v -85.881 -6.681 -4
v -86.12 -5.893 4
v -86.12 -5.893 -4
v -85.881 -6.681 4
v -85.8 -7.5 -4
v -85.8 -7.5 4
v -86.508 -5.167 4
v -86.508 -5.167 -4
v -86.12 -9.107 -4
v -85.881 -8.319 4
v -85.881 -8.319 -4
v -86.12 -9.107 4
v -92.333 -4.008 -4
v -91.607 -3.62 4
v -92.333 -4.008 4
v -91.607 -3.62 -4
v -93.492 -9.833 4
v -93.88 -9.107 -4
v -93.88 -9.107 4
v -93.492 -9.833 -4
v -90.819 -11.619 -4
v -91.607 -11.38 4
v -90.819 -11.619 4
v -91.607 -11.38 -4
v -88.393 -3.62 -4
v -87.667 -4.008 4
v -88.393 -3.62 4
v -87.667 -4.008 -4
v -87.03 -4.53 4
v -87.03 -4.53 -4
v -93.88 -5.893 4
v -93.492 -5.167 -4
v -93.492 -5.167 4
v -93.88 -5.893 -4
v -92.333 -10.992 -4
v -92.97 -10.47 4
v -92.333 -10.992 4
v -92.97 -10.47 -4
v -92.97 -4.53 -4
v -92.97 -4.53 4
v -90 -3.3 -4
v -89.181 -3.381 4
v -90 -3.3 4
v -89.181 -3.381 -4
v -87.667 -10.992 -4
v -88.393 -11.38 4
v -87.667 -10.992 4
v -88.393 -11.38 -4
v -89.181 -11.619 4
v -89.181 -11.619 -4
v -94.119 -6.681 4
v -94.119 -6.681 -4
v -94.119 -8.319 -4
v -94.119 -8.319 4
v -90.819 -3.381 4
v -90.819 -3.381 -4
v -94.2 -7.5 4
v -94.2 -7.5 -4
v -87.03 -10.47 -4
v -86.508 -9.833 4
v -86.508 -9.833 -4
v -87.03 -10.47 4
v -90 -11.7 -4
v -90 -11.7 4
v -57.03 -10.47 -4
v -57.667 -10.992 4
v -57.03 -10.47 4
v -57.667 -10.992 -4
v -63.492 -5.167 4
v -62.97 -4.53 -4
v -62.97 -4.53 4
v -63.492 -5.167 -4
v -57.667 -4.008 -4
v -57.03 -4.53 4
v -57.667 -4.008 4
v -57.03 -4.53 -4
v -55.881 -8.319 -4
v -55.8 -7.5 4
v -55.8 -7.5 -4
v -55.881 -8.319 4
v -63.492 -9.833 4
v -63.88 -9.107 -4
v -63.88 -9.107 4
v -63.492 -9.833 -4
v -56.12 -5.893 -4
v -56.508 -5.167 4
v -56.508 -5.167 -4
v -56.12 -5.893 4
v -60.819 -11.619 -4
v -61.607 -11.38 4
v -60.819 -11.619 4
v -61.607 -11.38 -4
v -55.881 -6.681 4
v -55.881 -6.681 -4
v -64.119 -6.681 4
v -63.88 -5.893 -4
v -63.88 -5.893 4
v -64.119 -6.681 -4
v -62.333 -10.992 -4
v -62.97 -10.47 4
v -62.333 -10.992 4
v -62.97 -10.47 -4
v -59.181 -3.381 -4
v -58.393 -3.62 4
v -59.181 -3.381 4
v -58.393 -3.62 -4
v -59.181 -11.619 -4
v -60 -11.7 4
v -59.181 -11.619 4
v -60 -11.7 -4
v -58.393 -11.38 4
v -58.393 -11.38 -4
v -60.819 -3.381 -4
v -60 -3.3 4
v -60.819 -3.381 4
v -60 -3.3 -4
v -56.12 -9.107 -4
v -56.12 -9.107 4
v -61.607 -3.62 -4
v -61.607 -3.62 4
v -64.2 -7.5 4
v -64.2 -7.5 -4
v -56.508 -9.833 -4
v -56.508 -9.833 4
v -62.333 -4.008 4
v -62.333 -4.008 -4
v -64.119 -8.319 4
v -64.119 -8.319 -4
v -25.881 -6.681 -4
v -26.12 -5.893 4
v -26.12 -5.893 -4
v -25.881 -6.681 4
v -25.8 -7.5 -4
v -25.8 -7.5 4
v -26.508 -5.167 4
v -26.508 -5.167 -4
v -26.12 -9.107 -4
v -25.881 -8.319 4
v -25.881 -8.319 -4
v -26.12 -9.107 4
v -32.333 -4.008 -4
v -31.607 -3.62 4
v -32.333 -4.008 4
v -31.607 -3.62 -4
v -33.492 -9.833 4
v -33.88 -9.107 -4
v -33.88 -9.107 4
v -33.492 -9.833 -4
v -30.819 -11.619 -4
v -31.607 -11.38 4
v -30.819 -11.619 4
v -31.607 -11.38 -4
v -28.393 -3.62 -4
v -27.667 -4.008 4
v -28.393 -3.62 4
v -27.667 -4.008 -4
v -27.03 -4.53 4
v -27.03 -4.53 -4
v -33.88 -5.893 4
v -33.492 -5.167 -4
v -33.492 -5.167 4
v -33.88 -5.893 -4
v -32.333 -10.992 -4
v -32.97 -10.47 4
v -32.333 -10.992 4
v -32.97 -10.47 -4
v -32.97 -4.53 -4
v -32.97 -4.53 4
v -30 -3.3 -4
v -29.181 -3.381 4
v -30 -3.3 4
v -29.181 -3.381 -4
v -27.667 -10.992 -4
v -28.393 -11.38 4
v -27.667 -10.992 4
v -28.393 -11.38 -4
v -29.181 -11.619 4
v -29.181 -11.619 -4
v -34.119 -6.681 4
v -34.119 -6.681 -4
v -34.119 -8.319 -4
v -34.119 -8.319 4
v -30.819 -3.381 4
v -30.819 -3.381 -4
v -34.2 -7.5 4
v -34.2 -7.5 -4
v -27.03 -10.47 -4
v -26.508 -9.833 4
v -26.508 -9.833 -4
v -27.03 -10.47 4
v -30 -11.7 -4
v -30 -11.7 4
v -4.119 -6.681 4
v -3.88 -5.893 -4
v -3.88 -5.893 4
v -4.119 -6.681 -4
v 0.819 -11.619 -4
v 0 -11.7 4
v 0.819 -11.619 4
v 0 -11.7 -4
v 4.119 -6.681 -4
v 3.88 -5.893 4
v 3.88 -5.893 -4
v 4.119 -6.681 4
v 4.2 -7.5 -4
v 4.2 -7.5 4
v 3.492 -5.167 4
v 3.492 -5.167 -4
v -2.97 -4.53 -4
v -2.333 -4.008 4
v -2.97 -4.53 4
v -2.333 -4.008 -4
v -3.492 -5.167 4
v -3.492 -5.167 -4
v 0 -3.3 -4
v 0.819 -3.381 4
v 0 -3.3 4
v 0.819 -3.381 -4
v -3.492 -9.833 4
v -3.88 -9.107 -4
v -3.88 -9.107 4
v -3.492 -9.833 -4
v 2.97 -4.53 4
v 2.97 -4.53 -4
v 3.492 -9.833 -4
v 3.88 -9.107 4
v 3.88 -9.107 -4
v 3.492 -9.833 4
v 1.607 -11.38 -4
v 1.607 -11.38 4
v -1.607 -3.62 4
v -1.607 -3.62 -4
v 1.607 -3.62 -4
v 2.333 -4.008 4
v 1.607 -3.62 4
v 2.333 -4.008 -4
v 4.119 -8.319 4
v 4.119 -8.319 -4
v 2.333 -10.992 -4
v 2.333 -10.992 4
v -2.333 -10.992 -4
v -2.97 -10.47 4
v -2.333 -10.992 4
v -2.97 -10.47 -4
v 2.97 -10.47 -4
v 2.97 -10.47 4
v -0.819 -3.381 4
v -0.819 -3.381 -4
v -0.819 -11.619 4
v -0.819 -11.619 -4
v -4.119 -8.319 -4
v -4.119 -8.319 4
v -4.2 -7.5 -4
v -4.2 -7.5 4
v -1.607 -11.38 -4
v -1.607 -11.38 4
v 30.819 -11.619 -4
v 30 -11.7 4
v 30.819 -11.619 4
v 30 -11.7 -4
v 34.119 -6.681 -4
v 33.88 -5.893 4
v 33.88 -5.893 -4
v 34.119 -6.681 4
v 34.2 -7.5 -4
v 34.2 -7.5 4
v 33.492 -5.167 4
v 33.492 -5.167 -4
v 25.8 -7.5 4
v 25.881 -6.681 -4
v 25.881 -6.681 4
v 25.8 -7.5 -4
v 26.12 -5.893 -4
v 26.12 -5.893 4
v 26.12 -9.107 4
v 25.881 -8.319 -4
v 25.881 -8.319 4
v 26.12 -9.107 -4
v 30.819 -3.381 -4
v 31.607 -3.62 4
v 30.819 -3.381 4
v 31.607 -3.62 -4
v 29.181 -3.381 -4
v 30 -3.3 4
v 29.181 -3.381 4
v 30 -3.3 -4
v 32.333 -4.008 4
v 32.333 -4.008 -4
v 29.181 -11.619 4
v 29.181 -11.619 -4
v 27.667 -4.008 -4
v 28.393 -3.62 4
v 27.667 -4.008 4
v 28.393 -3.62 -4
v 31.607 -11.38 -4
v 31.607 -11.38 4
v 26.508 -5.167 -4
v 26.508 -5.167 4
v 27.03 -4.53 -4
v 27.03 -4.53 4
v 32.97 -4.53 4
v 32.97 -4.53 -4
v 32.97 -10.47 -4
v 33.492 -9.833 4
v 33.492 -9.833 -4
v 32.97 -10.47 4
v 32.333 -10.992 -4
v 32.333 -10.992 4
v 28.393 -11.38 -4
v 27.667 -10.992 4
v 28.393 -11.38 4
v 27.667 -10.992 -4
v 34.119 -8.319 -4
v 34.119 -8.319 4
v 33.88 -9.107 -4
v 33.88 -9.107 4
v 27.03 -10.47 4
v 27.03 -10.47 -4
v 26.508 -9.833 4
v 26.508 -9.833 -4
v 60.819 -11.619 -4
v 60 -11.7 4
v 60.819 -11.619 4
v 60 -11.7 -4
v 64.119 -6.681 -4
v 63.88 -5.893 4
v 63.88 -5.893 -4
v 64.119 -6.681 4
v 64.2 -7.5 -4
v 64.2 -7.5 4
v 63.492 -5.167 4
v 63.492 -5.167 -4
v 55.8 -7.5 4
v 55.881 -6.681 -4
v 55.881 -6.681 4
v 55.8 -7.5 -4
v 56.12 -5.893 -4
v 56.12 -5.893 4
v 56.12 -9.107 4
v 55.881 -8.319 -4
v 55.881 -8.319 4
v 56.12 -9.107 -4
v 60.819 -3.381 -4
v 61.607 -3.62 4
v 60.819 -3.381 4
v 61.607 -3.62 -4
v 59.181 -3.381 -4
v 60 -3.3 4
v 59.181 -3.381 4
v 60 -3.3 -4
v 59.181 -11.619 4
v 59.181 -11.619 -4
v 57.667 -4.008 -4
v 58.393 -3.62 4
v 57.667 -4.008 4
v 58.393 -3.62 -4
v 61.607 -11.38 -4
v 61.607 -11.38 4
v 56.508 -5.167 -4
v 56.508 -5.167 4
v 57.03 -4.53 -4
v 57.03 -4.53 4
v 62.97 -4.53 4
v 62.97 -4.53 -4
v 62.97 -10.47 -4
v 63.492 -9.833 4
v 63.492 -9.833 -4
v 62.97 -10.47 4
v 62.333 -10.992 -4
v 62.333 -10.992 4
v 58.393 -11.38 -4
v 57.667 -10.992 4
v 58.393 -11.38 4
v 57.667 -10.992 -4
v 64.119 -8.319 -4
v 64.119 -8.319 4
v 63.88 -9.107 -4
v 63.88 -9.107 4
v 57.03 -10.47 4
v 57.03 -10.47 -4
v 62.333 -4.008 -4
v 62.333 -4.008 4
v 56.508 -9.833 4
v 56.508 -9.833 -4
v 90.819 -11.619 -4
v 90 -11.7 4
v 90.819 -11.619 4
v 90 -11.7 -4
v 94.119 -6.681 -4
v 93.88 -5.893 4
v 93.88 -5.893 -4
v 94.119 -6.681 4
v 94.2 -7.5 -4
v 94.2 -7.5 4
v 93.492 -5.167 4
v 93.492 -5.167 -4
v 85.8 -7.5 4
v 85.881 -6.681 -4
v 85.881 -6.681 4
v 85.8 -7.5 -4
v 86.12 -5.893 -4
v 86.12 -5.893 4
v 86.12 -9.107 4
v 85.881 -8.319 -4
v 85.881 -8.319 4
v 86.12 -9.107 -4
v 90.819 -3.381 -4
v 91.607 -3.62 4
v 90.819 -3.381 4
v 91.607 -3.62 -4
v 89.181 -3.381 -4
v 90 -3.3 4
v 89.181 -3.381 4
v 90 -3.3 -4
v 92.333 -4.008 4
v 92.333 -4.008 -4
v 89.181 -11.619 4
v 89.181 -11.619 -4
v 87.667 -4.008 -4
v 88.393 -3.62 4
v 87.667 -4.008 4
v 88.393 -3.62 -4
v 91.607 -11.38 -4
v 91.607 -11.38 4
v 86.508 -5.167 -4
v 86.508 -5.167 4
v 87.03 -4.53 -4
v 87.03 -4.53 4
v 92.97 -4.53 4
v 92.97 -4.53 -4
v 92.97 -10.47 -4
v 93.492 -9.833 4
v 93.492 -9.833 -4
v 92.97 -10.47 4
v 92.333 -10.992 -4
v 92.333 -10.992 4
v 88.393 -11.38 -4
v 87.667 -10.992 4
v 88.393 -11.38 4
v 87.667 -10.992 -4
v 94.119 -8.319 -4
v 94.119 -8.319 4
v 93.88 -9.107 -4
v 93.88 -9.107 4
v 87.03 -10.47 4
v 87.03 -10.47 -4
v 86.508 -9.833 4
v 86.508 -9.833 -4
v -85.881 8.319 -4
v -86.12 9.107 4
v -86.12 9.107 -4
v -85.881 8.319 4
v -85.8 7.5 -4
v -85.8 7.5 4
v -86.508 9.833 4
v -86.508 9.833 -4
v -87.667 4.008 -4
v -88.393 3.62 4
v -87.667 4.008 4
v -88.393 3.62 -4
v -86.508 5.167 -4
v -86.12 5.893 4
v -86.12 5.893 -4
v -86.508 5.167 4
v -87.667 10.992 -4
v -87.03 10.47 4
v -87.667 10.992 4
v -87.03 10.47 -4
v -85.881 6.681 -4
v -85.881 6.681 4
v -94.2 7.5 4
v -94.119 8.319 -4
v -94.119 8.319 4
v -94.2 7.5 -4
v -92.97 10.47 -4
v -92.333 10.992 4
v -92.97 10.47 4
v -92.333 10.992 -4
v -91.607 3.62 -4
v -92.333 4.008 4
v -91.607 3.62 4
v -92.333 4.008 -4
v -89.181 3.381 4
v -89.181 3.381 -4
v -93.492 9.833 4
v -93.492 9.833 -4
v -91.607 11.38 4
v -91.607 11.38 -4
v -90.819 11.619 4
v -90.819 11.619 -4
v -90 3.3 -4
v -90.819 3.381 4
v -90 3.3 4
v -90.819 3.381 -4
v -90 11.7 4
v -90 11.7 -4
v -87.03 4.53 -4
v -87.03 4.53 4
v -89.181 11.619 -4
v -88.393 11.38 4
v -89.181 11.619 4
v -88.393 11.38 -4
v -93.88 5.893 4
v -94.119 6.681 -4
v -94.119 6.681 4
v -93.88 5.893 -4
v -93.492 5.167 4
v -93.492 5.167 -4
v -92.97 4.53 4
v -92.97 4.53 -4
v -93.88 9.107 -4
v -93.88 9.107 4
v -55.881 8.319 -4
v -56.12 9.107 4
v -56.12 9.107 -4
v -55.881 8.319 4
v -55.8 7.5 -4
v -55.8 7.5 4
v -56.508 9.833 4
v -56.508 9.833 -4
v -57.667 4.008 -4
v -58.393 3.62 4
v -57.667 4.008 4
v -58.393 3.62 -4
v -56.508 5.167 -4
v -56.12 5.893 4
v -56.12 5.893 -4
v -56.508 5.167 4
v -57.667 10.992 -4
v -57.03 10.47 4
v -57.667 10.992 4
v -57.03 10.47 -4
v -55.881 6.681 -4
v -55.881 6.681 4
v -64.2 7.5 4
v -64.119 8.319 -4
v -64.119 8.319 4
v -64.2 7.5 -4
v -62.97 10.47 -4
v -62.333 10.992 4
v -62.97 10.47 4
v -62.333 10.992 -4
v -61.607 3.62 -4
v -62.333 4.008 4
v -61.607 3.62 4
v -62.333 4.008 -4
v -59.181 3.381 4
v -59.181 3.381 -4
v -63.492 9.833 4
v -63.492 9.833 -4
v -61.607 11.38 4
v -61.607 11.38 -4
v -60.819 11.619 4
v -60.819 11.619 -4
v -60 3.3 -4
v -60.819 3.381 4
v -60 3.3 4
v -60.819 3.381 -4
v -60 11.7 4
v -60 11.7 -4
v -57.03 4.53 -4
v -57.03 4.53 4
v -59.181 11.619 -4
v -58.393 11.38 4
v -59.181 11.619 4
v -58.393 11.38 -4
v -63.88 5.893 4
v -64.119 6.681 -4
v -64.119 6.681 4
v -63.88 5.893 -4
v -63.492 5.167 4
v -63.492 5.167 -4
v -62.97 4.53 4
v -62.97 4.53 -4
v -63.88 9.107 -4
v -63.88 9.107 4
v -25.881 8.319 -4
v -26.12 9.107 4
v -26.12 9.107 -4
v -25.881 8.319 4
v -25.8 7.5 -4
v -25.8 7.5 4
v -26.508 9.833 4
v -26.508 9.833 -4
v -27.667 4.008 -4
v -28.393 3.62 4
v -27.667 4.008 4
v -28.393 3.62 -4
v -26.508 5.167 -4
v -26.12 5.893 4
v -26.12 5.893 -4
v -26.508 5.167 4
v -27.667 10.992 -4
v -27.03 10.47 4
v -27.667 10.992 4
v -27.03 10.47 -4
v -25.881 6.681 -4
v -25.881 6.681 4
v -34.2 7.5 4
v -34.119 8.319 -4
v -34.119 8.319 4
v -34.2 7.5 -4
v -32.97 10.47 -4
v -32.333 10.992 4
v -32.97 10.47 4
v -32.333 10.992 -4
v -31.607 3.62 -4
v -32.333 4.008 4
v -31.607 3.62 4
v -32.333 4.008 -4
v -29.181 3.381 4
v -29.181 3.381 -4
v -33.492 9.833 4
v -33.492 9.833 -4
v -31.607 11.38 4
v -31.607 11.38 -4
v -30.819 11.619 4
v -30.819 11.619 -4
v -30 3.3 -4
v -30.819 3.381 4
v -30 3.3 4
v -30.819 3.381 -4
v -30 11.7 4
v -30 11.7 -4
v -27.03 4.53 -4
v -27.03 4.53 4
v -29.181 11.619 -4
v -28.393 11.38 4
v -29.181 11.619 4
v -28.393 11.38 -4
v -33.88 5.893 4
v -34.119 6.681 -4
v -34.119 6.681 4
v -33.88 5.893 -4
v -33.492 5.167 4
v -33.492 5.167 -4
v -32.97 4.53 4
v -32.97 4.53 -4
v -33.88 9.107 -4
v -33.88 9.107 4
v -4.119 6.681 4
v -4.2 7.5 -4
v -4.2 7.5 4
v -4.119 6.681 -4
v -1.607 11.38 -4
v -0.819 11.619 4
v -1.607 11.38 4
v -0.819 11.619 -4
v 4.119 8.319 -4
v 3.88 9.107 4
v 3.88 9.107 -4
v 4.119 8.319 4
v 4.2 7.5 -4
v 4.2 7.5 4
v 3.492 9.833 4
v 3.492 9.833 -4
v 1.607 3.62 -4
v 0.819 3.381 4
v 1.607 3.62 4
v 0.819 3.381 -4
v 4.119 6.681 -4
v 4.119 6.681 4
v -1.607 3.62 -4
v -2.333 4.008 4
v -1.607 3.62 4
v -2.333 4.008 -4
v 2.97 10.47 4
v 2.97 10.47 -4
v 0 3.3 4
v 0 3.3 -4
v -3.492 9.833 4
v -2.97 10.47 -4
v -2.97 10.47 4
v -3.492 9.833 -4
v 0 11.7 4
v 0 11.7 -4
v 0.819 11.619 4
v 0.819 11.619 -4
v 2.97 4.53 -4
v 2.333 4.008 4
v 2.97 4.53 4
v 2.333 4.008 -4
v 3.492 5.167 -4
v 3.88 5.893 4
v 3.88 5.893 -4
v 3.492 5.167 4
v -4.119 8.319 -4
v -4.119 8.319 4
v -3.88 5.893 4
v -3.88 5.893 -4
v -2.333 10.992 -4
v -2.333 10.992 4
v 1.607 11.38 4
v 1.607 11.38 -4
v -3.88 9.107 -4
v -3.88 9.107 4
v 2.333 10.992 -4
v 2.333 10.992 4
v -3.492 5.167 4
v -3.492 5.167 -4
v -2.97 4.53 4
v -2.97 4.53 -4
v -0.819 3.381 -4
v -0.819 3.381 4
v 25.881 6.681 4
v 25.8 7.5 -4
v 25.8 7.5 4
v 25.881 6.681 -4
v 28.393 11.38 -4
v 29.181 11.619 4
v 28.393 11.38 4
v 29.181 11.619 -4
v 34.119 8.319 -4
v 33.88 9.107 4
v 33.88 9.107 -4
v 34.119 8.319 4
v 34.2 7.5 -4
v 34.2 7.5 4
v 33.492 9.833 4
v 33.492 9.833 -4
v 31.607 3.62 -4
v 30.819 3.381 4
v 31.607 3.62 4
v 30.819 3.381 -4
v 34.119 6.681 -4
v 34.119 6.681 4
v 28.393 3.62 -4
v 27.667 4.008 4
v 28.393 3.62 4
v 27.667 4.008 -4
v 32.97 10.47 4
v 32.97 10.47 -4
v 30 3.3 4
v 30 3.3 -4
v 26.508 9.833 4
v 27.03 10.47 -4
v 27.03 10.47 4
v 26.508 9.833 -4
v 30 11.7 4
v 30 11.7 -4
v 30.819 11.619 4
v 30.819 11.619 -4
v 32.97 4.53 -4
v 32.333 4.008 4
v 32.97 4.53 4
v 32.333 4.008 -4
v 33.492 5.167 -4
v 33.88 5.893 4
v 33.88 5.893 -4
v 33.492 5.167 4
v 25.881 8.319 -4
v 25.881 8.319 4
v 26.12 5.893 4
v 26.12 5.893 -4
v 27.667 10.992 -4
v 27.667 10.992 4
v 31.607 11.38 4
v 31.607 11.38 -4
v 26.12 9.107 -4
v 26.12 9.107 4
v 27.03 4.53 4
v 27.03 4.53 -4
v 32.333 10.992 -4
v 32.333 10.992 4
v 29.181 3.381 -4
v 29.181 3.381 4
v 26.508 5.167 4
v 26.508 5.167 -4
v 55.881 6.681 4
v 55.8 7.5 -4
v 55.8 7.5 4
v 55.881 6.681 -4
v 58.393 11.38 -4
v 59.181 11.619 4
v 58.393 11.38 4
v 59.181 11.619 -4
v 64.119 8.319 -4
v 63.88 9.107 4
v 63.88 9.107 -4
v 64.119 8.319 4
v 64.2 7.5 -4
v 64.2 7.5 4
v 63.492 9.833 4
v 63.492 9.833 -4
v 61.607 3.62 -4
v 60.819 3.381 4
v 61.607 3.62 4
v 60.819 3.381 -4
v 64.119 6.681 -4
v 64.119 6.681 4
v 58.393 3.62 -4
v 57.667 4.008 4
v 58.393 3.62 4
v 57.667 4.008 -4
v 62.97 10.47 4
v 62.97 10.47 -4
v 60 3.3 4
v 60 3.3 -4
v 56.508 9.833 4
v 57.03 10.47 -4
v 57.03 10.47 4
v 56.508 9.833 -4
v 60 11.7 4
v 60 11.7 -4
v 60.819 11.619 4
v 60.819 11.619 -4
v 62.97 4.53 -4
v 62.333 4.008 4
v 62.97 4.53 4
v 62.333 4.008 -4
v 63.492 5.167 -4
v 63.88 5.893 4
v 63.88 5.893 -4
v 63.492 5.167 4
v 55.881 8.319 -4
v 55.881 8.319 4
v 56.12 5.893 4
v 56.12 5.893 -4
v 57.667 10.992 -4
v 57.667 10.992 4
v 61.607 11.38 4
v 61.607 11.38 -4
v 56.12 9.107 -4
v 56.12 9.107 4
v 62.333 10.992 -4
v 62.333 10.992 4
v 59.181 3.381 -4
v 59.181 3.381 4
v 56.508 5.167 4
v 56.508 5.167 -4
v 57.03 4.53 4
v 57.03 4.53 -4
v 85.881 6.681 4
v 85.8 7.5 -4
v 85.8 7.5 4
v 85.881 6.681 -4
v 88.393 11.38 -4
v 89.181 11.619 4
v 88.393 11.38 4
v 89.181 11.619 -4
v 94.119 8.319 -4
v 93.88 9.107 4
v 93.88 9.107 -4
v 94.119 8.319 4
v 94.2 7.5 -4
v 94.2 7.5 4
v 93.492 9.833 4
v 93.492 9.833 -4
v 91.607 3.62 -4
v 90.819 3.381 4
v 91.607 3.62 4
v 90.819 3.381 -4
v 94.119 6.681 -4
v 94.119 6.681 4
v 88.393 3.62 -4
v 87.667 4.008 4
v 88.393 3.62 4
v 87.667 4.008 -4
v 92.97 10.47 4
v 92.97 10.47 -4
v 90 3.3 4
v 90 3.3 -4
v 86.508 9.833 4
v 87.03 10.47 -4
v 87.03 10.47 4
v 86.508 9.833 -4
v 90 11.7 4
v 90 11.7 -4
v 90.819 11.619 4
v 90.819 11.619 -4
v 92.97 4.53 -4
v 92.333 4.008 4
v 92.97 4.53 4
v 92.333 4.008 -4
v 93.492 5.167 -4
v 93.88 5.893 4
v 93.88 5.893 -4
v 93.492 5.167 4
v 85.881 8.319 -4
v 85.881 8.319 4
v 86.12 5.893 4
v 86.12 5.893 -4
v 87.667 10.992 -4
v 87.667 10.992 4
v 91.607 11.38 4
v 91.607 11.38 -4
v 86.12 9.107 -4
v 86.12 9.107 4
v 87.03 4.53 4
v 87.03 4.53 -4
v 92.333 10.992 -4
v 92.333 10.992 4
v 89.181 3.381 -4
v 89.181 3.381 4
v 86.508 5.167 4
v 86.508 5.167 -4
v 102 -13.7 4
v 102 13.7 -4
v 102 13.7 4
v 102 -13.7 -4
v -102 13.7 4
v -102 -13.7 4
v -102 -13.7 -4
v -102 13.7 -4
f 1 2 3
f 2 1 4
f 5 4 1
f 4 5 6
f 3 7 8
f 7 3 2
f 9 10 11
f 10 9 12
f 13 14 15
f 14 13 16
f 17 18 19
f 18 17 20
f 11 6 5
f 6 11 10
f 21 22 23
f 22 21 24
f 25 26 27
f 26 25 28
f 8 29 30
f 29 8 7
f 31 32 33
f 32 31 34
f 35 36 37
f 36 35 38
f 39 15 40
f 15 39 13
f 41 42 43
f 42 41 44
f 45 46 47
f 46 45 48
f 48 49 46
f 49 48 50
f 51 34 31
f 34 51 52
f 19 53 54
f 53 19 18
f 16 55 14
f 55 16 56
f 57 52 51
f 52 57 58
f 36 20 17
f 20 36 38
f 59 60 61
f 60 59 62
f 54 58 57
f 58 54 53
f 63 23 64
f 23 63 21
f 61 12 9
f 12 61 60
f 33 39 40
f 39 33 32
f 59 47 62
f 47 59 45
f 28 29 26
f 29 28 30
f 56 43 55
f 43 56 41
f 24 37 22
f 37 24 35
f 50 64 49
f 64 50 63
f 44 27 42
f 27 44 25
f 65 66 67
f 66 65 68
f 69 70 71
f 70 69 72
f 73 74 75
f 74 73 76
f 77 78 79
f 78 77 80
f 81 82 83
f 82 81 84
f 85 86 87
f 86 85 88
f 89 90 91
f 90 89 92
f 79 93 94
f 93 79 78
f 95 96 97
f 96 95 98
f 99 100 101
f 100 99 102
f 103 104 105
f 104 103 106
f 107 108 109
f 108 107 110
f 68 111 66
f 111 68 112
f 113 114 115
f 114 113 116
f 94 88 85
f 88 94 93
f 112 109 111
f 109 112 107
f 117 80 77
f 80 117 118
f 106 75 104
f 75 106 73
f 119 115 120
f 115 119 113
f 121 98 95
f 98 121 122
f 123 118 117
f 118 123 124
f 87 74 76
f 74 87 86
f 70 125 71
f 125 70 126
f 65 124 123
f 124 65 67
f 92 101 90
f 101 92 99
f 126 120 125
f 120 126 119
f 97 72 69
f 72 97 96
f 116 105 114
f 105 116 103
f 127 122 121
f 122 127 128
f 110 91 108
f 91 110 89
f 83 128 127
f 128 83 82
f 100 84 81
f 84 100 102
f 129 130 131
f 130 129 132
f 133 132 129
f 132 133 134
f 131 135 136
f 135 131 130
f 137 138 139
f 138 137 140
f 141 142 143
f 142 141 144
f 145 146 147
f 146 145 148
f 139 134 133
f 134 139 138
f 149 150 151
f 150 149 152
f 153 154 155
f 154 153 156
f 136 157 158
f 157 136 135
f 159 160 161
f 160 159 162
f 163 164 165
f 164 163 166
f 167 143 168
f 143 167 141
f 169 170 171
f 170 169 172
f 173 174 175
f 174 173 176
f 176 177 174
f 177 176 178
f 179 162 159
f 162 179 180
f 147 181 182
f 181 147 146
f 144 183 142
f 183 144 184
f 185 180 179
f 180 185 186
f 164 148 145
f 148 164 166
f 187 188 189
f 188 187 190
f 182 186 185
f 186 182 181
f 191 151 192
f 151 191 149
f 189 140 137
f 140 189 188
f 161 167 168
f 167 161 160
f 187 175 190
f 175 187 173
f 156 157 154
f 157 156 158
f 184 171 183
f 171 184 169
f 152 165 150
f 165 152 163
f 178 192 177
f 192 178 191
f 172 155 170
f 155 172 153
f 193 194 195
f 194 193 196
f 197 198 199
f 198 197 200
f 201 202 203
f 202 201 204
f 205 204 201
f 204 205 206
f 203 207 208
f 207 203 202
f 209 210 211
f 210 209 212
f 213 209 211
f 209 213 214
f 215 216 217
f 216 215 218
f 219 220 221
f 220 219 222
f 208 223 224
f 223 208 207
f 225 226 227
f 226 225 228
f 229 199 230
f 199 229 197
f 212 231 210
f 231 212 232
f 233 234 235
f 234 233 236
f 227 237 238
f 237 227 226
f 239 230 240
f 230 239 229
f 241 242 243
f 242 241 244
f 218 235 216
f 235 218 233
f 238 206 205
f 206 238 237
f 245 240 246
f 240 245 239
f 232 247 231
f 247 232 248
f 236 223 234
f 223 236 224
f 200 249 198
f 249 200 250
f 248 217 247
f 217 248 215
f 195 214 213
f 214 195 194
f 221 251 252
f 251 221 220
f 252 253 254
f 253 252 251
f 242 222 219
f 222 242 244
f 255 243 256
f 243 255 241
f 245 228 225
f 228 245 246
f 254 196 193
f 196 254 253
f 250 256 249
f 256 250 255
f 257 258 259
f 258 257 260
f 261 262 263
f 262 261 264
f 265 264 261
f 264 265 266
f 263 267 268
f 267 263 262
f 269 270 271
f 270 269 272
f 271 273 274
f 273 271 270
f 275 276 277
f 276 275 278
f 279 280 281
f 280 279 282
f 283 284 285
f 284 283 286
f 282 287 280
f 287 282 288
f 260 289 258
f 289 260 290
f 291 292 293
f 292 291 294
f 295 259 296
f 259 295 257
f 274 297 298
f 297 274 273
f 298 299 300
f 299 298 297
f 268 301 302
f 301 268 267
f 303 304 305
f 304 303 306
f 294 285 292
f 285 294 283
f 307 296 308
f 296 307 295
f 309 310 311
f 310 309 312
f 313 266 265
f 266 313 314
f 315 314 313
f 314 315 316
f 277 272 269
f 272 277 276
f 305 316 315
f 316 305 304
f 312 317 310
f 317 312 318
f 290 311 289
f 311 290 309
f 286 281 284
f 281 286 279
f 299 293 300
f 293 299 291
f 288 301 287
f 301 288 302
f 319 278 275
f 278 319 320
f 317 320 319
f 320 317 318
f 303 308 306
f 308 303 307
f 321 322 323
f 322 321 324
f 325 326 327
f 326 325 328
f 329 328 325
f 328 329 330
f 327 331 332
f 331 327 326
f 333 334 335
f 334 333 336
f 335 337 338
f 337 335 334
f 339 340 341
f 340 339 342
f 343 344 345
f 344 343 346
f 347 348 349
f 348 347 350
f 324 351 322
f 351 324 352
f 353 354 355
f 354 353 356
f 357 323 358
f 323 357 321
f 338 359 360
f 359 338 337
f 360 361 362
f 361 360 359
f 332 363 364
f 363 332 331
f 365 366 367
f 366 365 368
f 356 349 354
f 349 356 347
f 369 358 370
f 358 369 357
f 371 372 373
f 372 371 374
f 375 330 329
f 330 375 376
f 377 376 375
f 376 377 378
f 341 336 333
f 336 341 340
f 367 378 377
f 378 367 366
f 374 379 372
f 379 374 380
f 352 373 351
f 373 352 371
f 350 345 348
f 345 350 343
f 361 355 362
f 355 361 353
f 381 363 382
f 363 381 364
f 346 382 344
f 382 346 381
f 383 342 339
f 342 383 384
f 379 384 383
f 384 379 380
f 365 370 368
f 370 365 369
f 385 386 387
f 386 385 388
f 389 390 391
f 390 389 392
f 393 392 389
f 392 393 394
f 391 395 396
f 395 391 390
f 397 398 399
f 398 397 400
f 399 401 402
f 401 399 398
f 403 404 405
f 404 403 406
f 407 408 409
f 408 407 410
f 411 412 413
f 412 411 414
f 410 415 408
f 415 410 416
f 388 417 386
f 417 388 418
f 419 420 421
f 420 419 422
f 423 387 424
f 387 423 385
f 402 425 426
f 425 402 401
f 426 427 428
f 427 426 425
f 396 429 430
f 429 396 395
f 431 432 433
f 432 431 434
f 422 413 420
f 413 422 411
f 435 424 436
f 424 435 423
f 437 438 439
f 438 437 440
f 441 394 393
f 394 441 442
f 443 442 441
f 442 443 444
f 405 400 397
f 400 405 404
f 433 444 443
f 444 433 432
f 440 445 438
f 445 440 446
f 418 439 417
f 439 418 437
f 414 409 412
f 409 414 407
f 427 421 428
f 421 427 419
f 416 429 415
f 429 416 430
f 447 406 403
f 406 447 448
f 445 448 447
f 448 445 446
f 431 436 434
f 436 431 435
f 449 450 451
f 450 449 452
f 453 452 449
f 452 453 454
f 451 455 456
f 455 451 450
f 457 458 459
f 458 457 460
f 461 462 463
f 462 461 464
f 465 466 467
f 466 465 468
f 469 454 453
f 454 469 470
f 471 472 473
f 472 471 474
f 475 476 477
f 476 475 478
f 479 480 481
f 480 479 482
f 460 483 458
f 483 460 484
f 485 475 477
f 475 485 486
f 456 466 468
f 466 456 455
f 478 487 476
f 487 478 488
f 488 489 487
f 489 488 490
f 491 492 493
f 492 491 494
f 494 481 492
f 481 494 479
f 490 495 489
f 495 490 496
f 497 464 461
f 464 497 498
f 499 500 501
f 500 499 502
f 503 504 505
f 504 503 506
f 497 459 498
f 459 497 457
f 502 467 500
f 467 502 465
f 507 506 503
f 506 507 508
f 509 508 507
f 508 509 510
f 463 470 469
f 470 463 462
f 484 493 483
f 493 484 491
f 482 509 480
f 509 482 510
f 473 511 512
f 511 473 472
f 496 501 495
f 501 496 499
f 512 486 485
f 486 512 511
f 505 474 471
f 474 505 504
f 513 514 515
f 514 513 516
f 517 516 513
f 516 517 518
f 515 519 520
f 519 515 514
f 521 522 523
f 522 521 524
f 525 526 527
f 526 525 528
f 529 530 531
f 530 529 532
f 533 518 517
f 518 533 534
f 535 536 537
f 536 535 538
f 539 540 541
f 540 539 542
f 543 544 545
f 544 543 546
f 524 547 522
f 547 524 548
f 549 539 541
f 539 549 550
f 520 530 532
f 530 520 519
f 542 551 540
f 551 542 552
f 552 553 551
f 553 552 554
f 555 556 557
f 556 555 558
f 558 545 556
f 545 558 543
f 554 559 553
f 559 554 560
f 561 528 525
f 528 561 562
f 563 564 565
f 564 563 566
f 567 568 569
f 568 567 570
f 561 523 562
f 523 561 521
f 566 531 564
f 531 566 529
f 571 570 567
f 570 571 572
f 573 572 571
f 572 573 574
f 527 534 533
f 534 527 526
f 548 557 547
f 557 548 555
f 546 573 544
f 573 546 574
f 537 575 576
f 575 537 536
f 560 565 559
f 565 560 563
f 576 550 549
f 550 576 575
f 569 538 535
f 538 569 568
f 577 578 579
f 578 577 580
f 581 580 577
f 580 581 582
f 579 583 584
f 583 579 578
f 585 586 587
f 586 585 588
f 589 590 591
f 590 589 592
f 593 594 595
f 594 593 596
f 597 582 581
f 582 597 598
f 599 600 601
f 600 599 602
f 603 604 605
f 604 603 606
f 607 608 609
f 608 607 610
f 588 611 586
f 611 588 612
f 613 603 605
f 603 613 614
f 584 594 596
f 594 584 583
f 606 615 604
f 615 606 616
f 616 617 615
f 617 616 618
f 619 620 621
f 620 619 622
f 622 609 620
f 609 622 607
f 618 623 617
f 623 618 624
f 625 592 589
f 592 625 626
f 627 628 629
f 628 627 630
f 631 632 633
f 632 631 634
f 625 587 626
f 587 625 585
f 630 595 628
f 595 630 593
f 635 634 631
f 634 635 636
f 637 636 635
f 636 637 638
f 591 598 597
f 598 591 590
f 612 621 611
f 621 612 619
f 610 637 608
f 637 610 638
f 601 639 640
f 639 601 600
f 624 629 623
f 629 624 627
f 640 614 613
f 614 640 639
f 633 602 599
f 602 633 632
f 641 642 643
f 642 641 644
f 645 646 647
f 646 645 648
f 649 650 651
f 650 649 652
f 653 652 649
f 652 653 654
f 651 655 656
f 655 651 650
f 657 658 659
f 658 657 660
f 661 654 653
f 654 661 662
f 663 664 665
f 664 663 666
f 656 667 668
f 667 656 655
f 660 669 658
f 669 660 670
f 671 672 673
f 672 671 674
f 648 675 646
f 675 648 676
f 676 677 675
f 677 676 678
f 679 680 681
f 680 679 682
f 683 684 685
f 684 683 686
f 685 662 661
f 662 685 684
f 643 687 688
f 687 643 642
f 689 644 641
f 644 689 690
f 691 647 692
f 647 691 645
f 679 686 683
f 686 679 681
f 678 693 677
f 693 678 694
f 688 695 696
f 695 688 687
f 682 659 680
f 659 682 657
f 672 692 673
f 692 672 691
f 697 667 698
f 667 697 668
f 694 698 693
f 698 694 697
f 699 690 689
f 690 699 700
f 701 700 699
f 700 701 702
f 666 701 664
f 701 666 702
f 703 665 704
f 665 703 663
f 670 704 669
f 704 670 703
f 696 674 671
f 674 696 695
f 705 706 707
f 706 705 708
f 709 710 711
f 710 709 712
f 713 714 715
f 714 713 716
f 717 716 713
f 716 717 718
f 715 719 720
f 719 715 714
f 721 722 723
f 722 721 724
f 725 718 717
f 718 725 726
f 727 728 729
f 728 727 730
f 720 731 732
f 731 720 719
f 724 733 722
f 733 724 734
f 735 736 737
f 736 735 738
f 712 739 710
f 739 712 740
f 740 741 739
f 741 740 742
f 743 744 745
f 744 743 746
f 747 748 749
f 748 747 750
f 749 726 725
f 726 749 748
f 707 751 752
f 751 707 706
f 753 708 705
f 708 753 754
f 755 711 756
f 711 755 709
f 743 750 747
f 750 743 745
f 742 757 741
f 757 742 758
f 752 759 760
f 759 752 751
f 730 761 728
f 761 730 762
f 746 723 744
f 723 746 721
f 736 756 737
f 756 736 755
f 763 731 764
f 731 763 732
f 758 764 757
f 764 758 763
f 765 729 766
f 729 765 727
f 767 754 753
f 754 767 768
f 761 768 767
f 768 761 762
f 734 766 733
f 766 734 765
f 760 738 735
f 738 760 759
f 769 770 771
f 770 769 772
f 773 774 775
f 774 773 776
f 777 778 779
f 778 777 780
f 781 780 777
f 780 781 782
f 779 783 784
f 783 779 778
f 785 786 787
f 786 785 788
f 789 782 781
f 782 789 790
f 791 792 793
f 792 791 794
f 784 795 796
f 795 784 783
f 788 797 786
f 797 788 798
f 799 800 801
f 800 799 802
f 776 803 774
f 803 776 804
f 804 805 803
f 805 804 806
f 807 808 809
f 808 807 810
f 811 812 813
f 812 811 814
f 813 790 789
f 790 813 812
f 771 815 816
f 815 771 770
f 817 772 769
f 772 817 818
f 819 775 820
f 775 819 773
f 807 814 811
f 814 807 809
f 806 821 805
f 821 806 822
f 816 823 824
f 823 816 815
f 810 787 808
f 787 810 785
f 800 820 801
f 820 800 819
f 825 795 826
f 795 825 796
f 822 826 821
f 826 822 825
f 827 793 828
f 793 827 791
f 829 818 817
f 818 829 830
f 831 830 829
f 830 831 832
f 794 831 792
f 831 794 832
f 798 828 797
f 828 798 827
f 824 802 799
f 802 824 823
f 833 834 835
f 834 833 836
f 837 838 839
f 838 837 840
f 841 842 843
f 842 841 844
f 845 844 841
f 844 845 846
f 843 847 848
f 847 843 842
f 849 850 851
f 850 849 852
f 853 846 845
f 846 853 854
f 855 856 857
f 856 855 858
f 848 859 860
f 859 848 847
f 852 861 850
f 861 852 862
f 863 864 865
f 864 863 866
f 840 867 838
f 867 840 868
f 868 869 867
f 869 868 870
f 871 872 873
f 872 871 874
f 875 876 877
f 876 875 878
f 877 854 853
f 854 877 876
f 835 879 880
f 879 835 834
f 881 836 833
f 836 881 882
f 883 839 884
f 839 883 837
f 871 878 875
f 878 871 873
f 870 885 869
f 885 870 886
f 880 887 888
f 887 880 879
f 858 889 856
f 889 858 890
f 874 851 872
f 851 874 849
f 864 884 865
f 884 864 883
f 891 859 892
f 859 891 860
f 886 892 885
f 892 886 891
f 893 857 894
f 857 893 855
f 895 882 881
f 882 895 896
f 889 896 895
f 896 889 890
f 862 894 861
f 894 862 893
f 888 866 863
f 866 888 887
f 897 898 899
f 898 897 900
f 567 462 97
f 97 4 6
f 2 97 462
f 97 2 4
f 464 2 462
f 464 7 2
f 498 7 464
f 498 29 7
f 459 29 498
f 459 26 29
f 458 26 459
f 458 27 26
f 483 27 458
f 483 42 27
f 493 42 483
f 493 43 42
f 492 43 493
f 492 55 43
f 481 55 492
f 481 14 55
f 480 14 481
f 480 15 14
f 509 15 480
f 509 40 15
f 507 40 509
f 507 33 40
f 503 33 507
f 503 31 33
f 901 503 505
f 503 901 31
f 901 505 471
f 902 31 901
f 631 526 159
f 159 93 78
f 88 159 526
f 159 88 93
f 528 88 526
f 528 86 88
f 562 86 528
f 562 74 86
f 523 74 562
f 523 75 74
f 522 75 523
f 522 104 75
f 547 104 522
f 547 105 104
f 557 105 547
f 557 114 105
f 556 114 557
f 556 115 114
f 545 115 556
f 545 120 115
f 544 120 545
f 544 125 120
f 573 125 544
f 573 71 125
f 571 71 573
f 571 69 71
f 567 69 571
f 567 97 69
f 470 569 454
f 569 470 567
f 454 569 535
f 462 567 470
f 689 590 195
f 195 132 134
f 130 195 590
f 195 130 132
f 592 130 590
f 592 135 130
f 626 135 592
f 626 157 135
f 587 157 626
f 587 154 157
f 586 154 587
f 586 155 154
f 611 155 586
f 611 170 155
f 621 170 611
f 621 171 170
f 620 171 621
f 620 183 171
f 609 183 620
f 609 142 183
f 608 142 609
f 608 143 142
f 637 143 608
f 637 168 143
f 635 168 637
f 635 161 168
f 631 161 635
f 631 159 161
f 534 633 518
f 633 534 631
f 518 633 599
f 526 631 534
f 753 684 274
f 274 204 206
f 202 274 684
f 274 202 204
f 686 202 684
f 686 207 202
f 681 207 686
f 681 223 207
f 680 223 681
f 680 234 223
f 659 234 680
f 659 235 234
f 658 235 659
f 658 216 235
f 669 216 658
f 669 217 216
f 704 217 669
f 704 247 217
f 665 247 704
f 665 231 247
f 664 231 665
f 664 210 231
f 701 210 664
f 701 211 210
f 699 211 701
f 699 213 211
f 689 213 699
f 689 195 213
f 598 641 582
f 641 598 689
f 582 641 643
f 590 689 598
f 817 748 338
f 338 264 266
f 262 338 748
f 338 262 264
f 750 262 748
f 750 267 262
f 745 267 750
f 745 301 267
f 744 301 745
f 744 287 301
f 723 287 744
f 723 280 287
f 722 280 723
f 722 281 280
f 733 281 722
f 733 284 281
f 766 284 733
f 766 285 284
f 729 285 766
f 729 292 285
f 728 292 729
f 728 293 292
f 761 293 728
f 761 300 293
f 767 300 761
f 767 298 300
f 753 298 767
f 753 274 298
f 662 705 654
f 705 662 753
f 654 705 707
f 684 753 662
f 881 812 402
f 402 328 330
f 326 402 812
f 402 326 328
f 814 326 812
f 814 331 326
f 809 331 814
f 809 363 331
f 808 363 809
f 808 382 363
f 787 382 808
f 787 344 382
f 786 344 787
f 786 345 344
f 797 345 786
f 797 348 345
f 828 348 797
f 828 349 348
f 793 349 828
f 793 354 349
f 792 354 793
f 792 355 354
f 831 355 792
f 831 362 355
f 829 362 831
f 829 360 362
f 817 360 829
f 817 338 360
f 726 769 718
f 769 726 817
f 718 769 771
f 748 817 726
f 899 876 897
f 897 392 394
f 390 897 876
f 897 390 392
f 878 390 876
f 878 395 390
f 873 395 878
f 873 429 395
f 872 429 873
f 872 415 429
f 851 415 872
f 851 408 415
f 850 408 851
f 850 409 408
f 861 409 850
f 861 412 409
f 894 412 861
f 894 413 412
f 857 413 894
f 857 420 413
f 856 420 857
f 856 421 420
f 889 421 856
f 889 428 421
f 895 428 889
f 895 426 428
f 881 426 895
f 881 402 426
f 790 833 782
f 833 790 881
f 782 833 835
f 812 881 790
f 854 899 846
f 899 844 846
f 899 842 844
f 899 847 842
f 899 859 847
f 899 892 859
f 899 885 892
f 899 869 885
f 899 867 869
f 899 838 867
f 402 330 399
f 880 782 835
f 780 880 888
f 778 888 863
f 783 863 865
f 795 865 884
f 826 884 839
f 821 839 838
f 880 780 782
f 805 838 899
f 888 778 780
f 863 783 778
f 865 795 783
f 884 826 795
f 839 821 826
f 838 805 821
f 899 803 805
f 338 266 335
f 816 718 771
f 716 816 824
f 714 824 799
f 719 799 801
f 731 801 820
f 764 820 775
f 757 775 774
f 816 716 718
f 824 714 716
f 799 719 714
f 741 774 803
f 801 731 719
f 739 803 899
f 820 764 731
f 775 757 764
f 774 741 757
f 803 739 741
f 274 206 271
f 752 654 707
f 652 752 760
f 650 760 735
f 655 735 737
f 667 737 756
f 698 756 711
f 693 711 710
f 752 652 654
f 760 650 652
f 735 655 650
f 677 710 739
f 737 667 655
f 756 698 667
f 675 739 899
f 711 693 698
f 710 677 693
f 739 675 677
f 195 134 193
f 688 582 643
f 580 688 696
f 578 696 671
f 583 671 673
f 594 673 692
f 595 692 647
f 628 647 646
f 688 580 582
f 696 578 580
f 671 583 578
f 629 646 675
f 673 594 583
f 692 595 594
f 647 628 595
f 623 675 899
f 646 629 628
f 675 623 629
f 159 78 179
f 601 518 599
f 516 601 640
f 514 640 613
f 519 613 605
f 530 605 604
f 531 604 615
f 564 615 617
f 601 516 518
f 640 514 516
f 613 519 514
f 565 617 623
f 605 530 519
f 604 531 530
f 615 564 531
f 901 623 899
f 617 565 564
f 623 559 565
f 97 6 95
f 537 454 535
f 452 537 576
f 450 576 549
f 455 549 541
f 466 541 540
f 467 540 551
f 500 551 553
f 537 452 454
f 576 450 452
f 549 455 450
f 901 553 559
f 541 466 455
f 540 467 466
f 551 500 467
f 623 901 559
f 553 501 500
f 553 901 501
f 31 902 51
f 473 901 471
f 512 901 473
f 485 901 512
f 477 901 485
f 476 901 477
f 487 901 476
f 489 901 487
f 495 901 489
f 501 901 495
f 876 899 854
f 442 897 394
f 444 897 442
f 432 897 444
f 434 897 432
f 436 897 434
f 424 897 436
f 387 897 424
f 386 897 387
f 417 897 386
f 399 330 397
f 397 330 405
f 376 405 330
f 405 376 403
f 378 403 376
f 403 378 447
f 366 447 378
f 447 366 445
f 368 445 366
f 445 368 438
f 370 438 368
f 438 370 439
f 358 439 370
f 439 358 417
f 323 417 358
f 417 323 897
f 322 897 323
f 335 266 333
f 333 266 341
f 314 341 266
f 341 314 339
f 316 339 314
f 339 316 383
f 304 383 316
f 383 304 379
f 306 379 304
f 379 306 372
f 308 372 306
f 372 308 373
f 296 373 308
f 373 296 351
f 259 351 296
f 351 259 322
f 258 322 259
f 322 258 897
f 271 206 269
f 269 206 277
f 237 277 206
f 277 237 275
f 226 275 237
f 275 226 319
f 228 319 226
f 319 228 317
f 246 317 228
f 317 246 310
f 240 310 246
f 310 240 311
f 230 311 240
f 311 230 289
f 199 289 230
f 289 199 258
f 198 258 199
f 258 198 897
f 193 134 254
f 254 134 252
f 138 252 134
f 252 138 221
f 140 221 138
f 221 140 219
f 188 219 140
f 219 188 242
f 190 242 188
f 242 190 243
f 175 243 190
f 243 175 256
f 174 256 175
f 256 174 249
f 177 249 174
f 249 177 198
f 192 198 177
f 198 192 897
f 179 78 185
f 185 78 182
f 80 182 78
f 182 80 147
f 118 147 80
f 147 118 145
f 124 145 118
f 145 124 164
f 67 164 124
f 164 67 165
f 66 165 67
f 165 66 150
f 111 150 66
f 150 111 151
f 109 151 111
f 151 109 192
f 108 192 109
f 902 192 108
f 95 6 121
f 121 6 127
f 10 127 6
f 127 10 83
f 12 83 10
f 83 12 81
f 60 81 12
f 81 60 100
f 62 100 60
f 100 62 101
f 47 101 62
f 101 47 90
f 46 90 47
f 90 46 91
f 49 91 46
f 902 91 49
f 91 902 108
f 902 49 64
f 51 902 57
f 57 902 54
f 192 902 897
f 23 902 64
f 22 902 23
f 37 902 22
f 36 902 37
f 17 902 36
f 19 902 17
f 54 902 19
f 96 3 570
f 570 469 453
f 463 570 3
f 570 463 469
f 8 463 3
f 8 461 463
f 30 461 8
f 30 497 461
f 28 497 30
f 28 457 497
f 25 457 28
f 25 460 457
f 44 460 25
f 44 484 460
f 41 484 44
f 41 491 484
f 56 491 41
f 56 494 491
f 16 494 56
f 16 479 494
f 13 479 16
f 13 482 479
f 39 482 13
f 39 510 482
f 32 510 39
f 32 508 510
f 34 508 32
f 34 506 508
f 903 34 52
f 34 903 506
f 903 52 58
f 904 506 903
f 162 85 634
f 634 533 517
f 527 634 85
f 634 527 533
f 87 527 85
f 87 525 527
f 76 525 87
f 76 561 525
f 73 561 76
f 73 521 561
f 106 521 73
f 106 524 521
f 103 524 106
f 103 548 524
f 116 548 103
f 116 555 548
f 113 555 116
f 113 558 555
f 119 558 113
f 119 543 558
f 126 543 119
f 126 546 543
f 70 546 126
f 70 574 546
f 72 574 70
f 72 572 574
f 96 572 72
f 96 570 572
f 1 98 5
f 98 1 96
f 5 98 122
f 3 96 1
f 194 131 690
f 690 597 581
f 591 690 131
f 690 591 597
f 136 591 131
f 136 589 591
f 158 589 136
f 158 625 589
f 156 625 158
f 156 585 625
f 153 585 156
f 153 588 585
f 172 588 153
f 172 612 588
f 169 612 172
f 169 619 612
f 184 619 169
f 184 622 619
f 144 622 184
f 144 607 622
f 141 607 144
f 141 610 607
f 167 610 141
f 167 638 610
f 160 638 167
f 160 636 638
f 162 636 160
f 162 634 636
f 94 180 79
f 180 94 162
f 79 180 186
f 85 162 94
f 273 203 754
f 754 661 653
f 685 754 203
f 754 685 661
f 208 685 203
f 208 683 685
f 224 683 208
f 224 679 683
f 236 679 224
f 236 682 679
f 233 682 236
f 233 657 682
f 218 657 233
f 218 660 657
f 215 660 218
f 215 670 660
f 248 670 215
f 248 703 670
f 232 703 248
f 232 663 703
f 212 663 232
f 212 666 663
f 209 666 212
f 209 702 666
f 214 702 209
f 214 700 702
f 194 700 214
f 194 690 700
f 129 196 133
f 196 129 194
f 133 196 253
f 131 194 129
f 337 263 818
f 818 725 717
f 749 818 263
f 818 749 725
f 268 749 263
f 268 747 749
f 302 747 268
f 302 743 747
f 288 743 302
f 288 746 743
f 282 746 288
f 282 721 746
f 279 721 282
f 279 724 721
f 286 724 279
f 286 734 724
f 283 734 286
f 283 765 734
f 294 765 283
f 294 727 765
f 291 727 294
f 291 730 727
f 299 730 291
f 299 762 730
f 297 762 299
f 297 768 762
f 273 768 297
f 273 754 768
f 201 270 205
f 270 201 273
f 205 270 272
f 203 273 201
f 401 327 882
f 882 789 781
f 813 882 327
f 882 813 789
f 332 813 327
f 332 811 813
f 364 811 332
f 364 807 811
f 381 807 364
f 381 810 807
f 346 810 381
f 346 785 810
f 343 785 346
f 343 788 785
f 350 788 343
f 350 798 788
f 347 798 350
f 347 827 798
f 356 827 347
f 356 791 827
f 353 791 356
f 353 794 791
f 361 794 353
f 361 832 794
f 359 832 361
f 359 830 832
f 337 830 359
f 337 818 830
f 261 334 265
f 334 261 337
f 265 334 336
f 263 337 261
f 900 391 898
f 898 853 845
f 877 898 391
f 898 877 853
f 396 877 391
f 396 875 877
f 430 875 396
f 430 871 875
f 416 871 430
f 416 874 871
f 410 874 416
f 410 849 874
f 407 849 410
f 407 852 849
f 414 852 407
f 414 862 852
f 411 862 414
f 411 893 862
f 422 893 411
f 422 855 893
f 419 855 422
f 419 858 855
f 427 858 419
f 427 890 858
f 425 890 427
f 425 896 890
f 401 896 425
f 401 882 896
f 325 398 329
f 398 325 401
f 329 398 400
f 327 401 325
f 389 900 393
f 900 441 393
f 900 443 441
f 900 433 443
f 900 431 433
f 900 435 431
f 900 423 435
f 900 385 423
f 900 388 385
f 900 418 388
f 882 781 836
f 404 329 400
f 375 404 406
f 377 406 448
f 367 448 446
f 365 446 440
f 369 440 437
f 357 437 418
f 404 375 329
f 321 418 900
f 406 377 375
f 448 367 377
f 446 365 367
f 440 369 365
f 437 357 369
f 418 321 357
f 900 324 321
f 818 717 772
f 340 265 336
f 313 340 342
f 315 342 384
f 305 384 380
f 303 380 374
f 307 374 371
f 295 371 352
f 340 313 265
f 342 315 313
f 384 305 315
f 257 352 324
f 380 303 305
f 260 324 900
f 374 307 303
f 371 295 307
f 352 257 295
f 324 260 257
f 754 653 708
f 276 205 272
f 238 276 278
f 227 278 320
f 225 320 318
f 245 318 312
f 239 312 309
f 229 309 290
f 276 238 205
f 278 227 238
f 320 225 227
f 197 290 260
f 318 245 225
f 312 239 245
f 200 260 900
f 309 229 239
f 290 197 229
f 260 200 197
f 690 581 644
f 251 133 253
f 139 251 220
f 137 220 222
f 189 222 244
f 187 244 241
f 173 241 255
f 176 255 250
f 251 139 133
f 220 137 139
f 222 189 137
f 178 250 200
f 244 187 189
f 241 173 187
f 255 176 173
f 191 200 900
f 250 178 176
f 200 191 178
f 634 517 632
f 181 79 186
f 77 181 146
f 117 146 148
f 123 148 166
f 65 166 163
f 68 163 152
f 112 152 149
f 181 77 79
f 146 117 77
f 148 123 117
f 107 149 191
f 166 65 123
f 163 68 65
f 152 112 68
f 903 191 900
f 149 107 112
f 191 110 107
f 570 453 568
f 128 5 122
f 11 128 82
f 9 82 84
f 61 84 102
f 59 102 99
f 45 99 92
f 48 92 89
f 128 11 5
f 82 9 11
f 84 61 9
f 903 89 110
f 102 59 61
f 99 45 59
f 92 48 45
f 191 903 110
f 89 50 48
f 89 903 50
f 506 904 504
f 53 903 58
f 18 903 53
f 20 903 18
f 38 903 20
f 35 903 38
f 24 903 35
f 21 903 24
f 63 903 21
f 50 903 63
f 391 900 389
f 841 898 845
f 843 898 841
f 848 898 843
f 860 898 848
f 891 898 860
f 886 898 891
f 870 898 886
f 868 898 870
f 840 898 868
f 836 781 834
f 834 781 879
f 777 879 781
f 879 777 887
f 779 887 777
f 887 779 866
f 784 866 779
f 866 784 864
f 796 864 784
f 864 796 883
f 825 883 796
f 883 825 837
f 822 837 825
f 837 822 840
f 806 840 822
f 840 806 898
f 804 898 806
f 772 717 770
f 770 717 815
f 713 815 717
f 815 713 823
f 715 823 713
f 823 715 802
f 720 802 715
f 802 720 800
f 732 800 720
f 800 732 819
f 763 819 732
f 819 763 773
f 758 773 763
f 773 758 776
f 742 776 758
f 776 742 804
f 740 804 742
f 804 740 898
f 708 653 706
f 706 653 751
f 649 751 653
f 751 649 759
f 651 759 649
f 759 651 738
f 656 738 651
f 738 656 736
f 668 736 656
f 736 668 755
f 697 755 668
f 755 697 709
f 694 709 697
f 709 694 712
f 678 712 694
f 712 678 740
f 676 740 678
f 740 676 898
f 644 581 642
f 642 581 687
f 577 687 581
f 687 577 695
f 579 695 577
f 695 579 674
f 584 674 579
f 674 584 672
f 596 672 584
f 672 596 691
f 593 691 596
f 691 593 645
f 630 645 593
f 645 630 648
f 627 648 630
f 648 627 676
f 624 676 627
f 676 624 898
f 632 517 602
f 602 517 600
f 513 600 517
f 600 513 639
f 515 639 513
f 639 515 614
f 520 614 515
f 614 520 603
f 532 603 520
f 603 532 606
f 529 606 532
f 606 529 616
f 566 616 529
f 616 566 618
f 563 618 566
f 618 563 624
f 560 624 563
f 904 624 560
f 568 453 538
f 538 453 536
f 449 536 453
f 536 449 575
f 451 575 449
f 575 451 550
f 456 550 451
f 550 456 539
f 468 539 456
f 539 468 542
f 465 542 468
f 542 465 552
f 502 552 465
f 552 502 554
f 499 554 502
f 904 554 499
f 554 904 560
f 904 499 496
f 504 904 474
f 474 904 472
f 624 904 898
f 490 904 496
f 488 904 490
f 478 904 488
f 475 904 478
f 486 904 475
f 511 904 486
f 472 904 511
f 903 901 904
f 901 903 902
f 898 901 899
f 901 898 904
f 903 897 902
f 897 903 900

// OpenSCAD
$fn = 32;

// ----------------------------------------------------------------------
// Hole bar, 7 x Ø8.4
// tworows layout, 12 mm edge offset
// ----------------------------------------------------------------------

// --- parameters (mm) ---
bar_w = 27.4;     // bar width (Y)
bar_t = 8;        // bar thickness (Z)
holes = 7;        // holes per row
hole_d = 8.4;     // hole diameter
edge = 12;        // offset from the bar end to the first hole
pitch = 30;       // pitch between neighbouring holes
row_offset = 15;  // distance between the two rows

// --- derived feature positions (mm) ---
span = (holes - 1) * pitch;   // = 180   distance between the end holes
bar_l = span + 2 * edge;      // = 204   overall bar length
start_x = -bar_l / 2 + edge;  // = -90   X of the first hole
feature_centers = [
  [start_x + 0 * pitch, -row_offset / 2],
  [start_x + 1 * pitch, -row_offset / 2],
  [start_x + 2 * pitch, -row_offset / 2],
  [start_x + 3 * pitch, -row_offset / 2],
  [start_x + 4 * pitch, -row_offset / 2],
  [start_x + 5 * pitch, -row_offset / 2],
  [start_x + 6 * pitch, -row_offset / 2]
];   // hole centres of the first row
row2_centers = [
  [start_x + 0 * pitch, row_offset / 2],
  [start_x + 1 * pitch, row_offset / 2],
  [start_x + 2 * pitch, row_offset / 2],
  [start_x + 3 * pitch, row_offset / 2],
  [start_x + 4 * pitch, row_offset / 2],
  [start_x + 5 * pitch, row_offset / 2],
  [start_x + 6 * pitch, row_offset / 2]
];   // hole centres of the second row

// bar with two rows of holes, both read from their own centre arrays
difference() {
  translate([-bar_l / 2, -bar_w / 2, -bar_t / 2]) cube([bar_l, bar_w, bar_t]);
  for (centre = feature_centers)
    translate([centre[0], centre[1], 0])
      cylinder(d = hole_d, h = bar_t + 2, center = true);
  for (centre = row2_centers)
    translate([centre[0], centre[1], 0])
      cylinder(d = hole_d, h = bar_t + 2, center = true);
}
